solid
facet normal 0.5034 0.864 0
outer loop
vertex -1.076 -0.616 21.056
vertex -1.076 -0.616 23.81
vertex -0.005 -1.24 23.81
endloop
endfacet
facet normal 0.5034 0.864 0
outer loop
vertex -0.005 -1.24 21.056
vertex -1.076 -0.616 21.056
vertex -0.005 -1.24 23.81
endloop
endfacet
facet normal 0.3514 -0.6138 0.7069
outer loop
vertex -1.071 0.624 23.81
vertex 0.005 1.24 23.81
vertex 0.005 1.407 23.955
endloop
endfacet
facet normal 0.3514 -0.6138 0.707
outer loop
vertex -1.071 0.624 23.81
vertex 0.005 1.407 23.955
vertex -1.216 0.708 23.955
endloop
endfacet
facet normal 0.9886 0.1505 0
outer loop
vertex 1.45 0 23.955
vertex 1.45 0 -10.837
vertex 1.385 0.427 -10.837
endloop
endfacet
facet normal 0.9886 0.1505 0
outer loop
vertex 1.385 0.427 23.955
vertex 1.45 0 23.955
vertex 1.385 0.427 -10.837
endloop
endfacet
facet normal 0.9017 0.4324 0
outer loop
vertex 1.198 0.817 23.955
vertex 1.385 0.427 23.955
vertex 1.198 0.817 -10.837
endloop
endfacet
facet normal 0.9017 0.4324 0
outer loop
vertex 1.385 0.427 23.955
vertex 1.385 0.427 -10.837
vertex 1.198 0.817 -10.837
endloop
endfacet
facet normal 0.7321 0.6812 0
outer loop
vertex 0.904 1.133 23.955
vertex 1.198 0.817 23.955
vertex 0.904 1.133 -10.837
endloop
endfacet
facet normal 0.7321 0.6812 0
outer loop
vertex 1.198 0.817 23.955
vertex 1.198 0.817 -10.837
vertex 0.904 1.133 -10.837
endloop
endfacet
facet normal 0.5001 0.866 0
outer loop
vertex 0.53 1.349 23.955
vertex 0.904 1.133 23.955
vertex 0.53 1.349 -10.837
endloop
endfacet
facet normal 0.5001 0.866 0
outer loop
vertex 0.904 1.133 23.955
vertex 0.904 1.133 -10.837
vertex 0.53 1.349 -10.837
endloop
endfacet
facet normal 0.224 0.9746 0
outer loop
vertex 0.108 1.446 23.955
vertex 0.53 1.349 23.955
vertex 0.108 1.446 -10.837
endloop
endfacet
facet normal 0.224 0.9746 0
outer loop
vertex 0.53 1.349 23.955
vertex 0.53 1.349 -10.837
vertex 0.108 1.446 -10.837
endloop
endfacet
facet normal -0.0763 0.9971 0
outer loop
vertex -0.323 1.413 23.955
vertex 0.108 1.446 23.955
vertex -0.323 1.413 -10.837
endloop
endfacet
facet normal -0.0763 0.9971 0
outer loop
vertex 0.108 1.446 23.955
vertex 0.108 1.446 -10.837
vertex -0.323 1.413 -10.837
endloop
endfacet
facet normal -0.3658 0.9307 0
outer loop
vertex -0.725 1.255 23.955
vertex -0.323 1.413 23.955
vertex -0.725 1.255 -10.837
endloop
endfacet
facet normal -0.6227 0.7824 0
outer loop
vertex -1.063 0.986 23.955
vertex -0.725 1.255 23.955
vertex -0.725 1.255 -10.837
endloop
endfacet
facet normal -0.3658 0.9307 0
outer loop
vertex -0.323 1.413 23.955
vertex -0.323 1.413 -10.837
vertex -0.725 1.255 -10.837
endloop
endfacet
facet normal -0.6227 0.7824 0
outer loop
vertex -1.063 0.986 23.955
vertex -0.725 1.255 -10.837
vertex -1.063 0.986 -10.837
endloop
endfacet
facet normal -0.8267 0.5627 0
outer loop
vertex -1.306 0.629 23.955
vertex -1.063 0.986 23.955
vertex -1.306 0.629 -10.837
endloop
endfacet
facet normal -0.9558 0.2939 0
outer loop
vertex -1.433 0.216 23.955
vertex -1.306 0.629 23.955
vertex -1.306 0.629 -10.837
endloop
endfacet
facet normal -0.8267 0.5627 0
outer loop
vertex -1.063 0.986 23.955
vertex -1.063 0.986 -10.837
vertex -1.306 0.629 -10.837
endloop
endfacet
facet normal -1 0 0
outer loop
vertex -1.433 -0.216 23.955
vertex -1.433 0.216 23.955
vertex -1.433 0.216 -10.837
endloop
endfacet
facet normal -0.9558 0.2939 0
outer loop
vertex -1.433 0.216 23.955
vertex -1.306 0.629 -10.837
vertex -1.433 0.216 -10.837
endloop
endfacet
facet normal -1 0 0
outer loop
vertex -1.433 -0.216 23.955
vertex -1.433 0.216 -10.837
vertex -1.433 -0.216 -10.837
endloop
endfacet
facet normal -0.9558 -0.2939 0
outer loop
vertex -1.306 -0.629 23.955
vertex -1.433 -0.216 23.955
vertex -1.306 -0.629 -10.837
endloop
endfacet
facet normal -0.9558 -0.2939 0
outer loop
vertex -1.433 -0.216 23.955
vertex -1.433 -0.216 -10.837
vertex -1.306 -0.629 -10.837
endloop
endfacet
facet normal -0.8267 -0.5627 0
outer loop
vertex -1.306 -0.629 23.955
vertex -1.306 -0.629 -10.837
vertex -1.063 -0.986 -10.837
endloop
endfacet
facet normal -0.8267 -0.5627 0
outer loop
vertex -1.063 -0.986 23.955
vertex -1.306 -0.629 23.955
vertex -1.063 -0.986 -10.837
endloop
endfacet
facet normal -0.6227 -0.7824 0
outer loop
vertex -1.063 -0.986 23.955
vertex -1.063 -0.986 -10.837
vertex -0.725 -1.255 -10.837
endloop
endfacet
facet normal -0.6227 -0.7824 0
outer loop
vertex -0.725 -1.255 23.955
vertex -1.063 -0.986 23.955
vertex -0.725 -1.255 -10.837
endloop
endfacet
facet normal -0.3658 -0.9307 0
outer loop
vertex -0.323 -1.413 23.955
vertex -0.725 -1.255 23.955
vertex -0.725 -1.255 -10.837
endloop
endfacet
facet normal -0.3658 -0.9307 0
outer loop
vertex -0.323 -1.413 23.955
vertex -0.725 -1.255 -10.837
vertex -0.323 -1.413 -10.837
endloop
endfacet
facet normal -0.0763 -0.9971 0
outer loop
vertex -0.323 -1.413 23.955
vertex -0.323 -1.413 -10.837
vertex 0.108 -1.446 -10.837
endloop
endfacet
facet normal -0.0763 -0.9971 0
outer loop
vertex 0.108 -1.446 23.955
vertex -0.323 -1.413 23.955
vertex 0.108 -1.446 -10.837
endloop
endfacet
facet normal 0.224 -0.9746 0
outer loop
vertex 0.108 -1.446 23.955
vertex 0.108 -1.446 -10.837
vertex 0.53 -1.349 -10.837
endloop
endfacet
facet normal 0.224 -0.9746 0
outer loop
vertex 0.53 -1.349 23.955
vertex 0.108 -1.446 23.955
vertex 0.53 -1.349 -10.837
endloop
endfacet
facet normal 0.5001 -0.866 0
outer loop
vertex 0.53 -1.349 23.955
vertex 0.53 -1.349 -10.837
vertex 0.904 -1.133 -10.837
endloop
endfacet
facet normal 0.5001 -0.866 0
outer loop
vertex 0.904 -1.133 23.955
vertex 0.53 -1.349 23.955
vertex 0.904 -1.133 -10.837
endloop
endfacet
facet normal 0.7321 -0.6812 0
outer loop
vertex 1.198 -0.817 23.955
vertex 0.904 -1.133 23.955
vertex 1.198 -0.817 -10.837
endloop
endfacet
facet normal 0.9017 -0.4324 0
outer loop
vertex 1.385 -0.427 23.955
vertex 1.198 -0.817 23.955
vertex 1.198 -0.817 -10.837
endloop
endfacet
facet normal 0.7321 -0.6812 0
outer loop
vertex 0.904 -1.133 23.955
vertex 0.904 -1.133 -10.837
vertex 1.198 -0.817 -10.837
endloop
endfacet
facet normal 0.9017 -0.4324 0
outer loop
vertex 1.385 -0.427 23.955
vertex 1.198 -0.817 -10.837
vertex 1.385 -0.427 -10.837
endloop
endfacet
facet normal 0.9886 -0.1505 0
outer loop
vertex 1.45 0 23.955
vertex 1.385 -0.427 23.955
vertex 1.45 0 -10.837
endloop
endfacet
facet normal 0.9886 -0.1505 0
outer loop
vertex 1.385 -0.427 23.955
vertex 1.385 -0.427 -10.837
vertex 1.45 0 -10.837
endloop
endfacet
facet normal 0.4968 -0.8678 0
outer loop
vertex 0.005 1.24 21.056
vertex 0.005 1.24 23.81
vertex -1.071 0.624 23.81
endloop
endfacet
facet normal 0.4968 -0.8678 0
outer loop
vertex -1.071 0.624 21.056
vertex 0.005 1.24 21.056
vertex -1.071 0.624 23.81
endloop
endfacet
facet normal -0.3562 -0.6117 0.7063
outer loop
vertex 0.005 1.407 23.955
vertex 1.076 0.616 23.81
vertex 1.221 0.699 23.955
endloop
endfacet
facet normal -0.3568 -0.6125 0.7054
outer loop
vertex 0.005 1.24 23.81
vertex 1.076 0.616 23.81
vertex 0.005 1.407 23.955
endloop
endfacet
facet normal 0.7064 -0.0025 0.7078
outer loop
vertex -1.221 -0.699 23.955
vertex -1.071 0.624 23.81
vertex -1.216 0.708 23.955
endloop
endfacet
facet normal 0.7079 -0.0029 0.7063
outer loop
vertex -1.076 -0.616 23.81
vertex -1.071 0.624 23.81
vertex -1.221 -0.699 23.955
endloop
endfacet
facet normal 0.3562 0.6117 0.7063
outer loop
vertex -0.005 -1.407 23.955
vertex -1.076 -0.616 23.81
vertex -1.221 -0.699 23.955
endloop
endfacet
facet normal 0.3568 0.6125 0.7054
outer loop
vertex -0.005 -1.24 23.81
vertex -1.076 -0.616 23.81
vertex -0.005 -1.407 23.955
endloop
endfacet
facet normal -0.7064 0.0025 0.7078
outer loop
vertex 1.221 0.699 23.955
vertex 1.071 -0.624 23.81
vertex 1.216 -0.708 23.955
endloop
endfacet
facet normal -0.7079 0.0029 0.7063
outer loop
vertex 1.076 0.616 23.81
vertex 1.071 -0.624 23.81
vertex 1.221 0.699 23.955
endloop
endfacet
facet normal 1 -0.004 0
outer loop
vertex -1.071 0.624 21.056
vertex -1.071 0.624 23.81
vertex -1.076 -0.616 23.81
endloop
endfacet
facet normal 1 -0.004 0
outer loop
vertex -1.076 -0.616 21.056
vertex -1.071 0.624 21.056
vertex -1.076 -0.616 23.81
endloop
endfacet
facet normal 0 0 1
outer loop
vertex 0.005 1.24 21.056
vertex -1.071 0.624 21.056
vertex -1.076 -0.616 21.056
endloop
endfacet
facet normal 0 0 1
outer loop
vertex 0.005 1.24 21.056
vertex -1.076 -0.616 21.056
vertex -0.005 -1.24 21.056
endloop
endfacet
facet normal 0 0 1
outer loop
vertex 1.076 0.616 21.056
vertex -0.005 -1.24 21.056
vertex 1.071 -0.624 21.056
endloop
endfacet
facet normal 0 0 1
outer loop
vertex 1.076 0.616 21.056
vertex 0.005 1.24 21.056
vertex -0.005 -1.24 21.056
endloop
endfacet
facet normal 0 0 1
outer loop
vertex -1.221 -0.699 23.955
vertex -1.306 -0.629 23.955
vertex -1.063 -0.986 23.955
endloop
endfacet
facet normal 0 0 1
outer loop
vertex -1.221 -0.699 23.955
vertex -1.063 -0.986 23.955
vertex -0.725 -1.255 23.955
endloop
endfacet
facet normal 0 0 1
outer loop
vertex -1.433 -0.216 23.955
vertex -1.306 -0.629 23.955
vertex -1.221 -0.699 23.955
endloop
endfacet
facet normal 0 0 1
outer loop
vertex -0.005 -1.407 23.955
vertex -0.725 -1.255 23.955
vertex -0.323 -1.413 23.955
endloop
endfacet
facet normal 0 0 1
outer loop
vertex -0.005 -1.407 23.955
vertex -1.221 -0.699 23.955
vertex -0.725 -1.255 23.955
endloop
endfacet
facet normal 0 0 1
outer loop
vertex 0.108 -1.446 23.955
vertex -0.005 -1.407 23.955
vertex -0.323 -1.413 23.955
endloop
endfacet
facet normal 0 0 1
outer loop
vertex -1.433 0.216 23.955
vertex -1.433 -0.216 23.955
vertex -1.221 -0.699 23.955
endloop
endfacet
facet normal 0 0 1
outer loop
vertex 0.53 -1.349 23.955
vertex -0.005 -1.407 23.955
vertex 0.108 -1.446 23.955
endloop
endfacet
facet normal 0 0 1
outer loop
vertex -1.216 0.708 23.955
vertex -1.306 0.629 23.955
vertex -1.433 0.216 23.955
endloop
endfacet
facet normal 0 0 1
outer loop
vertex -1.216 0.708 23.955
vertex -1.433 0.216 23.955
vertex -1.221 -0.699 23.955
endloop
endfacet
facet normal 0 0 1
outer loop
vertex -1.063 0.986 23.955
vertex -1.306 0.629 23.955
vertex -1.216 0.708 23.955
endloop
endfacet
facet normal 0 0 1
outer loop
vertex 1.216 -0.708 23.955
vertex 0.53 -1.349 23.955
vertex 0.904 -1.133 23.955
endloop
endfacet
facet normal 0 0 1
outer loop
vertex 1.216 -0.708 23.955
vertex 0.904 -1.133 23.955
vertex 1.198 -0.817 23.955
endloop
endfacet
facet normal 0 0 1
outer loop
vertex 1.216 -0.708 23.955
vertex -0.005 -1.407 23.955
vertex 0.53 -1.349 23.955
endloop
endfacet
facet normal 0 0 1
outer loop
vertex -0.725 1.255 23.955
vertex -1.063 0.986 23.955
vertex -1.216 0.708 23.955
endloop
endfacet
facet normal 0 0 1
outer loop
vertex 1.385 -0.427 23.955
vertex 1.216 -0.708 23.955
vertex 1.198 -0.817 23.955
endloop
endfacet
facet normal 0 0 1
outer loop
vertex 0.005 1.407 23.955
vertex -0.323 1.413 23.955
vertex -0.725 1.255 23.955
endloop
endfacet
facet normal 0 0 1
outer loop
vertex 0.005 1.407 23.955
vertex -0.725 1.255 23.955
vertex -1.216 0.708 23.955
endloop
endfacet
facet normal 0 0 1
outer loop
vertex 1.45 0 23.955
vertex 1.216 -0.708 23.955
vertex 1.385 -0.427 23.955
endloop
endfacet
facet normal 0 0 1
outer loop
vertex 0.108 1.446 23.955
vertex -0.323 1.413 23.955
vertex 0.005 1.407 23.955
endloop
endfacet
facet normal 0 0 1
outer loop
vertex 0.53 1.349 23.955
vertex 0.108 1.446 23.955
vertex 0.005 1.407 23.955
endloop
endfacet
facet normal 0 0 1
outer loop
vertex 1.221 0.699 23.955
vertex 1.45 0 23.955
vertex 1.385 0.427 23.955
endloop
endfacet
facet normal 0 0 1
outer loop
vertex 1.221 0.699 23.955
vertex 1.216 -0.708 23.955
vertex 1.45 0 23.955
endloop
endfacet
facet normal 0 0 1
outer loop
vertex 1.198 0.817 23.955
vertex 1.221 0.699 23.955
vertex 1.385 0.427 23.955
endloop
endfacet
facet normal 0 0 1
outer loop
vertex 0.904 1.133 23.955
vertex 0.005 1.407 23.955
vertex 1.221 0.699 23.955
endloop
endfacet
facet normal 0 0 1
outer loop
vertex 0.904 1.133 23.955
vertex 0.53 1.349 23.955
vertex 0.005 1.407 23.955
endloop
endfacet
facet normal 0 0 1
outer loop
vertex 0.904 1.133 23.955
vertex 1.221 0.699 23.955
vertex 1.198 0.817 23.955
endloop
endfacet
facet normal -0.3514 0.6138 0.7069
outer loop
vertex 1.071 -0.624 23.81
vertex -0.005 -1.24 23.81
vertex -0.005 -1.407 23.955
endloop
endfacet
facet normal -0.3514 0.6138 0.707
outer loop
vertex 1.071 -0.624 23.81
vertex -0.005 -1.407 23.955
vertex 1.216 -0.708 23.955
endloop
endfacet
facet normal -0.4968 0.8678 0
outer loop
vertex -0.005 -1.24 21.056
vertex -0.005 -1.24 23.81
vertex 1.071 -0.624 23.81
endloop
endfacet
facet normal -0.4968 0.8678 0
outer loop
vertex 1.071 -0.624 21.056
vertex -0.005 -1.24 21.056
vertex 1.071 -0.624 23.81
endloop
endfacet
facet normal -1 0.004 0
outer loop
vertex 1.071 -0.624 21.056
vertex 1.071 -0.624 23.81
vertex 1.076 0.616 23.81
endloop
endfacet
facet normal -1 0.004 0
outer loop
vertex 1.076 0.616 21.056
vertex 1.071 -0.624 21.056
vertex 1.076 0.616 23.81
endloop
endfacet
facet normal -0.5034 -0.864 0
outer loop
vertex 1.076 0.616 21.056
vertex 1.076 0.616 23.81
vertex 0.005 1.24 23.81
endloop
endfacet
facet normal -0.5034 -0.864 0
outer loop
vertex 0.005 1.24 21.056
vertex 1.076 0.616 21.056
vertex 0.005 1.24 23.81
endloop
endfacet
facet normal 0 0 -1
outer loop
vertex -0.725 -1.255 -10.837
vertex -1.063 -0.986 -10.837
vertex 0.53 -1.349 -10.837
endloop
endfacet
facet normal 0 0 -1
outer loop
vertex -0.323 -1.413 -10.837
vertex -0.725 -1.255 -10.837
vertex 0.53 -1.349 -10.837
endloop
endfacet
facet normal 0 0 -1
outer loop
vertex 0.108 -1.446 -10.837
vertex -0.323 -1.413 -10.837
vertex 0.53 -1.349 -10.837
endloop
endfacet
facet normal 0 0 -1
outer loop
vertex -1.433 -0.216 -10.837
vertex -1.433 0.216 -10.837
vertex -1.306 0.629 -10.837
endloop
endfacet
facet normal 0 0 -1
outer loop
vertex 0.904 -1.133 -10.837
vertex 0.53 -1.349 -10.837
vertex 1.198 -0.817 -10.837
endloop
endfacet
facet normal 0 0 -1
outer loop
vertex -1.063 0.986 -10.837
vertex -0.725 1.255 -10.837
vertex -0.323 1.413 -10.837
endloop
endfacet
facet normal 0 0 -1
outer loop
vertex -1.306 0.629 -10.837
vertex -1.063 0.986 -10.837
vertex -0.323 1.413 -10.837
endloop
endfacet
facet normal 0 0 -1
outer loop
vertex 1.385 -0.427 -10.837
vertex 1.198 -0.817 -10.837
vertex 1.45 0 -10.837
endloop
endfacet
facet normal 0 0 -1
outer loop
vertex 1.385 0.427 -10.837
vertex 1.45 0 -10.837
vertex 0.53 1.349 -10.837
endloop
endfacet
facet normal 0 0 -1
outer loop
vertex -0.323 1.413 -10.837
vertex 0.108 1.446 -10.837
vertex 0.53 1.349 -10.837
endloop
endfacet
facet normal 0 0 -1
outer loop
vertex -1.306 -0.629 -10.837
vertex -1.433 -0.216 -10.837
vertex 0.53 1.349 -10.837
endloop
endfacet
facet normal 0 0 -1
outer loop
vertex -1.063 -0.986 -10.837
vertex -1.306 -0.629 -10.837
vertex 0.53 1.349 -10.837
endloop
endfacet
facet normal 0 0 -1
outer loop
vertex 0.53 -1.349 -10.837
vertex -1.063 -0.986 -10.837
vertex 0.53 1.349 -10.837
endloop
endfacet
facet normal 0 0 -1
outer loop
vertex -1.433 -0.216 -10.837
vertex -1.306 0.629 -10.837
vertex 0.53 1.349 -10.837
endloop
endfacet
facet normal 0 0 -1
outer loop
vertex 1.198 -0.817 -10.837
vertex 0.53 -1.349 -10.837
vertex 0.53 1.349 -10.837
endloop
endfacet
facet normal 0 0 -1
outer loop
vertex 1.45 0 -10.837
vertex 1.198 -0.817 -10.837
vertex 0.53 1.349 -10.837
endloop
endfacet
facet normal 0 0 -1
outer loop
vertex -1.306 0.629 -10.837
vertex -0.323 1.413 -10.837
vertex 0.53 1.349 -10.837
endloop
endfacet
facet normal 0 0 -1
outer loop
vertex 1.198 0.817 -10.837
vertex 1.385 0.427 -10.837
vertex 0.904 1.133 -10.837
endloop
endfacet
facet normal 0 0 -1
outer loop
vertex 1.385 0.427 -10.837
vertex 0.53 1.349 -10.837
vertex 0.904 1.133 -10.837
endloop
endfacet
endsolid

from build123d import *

# Parameters (mm, degrees)
SKETCH1_R           = 0.5
BOSS_EXTRUDE1_DEPTH = 12
CUT_EXTRUDE1_DEPTH  = 1
CHAMFER1_SIZE       = 0.05
SCALE1_SCALE        = 1.9329
SCALE2_SCALE        = 1.5


with BuildPart() as part:
    # Sketch1 → Boss-Extrude1 (new body)
    with BuildSketch(Plane.XY):
        Circle(SKETCH1_R)
    extrude(amount=BOSS_EXTRUDE1_DEPTH)

    # Sketch2 → Cut-Extrude1 (cut)
    with BuildSketch(Plane.XY.offset(12)):
        Polygon((0.369541813, -0.215248582), (0.371181646, 0.212408307), (0.001639833, 0.427656888), (-0.369541813, 0.215248582), (-0.371181646, -0.212408307), (-0.001639833, -0.427656888), align=None)
    extrude(amount=-CUT_EXTRUDE1_DEPTH, mode=Mode.SUBTRACT)

    # Chamfer1
    chamfer1_edges = [part.edges().sort_by_distance(p)[0] for p in [
        (0.18395099, -0.321452735, 12),
        (0.370361729, -0.001420137, 12),
        (0.18641074, 0.320032598, 12),
        (-0.18395099, 0.321452735, 12),
        (-0.370361729, 0.001420137, 12),
        (-0.18641074, -0.320032598, 12),
    ]]
    chamfer(chamfer1_edges, length=CHAMFER1_SIZE)


with BuildPart() as part_1:
    # Scale1: scaled about (0, 0, 5.705631977)
    add(part.part.scale(SCALE1_SCALE).moved(Location((0, 0, -5.322784071))))


with BuildPart() as part_2:
    # Scale2: scaled about (0, 0, 5.705631977)
    add(part_1.part.scale(SCALE2_SCALE).moved(Location((0, 0, -2.852815989))))


solid = part_2.part
